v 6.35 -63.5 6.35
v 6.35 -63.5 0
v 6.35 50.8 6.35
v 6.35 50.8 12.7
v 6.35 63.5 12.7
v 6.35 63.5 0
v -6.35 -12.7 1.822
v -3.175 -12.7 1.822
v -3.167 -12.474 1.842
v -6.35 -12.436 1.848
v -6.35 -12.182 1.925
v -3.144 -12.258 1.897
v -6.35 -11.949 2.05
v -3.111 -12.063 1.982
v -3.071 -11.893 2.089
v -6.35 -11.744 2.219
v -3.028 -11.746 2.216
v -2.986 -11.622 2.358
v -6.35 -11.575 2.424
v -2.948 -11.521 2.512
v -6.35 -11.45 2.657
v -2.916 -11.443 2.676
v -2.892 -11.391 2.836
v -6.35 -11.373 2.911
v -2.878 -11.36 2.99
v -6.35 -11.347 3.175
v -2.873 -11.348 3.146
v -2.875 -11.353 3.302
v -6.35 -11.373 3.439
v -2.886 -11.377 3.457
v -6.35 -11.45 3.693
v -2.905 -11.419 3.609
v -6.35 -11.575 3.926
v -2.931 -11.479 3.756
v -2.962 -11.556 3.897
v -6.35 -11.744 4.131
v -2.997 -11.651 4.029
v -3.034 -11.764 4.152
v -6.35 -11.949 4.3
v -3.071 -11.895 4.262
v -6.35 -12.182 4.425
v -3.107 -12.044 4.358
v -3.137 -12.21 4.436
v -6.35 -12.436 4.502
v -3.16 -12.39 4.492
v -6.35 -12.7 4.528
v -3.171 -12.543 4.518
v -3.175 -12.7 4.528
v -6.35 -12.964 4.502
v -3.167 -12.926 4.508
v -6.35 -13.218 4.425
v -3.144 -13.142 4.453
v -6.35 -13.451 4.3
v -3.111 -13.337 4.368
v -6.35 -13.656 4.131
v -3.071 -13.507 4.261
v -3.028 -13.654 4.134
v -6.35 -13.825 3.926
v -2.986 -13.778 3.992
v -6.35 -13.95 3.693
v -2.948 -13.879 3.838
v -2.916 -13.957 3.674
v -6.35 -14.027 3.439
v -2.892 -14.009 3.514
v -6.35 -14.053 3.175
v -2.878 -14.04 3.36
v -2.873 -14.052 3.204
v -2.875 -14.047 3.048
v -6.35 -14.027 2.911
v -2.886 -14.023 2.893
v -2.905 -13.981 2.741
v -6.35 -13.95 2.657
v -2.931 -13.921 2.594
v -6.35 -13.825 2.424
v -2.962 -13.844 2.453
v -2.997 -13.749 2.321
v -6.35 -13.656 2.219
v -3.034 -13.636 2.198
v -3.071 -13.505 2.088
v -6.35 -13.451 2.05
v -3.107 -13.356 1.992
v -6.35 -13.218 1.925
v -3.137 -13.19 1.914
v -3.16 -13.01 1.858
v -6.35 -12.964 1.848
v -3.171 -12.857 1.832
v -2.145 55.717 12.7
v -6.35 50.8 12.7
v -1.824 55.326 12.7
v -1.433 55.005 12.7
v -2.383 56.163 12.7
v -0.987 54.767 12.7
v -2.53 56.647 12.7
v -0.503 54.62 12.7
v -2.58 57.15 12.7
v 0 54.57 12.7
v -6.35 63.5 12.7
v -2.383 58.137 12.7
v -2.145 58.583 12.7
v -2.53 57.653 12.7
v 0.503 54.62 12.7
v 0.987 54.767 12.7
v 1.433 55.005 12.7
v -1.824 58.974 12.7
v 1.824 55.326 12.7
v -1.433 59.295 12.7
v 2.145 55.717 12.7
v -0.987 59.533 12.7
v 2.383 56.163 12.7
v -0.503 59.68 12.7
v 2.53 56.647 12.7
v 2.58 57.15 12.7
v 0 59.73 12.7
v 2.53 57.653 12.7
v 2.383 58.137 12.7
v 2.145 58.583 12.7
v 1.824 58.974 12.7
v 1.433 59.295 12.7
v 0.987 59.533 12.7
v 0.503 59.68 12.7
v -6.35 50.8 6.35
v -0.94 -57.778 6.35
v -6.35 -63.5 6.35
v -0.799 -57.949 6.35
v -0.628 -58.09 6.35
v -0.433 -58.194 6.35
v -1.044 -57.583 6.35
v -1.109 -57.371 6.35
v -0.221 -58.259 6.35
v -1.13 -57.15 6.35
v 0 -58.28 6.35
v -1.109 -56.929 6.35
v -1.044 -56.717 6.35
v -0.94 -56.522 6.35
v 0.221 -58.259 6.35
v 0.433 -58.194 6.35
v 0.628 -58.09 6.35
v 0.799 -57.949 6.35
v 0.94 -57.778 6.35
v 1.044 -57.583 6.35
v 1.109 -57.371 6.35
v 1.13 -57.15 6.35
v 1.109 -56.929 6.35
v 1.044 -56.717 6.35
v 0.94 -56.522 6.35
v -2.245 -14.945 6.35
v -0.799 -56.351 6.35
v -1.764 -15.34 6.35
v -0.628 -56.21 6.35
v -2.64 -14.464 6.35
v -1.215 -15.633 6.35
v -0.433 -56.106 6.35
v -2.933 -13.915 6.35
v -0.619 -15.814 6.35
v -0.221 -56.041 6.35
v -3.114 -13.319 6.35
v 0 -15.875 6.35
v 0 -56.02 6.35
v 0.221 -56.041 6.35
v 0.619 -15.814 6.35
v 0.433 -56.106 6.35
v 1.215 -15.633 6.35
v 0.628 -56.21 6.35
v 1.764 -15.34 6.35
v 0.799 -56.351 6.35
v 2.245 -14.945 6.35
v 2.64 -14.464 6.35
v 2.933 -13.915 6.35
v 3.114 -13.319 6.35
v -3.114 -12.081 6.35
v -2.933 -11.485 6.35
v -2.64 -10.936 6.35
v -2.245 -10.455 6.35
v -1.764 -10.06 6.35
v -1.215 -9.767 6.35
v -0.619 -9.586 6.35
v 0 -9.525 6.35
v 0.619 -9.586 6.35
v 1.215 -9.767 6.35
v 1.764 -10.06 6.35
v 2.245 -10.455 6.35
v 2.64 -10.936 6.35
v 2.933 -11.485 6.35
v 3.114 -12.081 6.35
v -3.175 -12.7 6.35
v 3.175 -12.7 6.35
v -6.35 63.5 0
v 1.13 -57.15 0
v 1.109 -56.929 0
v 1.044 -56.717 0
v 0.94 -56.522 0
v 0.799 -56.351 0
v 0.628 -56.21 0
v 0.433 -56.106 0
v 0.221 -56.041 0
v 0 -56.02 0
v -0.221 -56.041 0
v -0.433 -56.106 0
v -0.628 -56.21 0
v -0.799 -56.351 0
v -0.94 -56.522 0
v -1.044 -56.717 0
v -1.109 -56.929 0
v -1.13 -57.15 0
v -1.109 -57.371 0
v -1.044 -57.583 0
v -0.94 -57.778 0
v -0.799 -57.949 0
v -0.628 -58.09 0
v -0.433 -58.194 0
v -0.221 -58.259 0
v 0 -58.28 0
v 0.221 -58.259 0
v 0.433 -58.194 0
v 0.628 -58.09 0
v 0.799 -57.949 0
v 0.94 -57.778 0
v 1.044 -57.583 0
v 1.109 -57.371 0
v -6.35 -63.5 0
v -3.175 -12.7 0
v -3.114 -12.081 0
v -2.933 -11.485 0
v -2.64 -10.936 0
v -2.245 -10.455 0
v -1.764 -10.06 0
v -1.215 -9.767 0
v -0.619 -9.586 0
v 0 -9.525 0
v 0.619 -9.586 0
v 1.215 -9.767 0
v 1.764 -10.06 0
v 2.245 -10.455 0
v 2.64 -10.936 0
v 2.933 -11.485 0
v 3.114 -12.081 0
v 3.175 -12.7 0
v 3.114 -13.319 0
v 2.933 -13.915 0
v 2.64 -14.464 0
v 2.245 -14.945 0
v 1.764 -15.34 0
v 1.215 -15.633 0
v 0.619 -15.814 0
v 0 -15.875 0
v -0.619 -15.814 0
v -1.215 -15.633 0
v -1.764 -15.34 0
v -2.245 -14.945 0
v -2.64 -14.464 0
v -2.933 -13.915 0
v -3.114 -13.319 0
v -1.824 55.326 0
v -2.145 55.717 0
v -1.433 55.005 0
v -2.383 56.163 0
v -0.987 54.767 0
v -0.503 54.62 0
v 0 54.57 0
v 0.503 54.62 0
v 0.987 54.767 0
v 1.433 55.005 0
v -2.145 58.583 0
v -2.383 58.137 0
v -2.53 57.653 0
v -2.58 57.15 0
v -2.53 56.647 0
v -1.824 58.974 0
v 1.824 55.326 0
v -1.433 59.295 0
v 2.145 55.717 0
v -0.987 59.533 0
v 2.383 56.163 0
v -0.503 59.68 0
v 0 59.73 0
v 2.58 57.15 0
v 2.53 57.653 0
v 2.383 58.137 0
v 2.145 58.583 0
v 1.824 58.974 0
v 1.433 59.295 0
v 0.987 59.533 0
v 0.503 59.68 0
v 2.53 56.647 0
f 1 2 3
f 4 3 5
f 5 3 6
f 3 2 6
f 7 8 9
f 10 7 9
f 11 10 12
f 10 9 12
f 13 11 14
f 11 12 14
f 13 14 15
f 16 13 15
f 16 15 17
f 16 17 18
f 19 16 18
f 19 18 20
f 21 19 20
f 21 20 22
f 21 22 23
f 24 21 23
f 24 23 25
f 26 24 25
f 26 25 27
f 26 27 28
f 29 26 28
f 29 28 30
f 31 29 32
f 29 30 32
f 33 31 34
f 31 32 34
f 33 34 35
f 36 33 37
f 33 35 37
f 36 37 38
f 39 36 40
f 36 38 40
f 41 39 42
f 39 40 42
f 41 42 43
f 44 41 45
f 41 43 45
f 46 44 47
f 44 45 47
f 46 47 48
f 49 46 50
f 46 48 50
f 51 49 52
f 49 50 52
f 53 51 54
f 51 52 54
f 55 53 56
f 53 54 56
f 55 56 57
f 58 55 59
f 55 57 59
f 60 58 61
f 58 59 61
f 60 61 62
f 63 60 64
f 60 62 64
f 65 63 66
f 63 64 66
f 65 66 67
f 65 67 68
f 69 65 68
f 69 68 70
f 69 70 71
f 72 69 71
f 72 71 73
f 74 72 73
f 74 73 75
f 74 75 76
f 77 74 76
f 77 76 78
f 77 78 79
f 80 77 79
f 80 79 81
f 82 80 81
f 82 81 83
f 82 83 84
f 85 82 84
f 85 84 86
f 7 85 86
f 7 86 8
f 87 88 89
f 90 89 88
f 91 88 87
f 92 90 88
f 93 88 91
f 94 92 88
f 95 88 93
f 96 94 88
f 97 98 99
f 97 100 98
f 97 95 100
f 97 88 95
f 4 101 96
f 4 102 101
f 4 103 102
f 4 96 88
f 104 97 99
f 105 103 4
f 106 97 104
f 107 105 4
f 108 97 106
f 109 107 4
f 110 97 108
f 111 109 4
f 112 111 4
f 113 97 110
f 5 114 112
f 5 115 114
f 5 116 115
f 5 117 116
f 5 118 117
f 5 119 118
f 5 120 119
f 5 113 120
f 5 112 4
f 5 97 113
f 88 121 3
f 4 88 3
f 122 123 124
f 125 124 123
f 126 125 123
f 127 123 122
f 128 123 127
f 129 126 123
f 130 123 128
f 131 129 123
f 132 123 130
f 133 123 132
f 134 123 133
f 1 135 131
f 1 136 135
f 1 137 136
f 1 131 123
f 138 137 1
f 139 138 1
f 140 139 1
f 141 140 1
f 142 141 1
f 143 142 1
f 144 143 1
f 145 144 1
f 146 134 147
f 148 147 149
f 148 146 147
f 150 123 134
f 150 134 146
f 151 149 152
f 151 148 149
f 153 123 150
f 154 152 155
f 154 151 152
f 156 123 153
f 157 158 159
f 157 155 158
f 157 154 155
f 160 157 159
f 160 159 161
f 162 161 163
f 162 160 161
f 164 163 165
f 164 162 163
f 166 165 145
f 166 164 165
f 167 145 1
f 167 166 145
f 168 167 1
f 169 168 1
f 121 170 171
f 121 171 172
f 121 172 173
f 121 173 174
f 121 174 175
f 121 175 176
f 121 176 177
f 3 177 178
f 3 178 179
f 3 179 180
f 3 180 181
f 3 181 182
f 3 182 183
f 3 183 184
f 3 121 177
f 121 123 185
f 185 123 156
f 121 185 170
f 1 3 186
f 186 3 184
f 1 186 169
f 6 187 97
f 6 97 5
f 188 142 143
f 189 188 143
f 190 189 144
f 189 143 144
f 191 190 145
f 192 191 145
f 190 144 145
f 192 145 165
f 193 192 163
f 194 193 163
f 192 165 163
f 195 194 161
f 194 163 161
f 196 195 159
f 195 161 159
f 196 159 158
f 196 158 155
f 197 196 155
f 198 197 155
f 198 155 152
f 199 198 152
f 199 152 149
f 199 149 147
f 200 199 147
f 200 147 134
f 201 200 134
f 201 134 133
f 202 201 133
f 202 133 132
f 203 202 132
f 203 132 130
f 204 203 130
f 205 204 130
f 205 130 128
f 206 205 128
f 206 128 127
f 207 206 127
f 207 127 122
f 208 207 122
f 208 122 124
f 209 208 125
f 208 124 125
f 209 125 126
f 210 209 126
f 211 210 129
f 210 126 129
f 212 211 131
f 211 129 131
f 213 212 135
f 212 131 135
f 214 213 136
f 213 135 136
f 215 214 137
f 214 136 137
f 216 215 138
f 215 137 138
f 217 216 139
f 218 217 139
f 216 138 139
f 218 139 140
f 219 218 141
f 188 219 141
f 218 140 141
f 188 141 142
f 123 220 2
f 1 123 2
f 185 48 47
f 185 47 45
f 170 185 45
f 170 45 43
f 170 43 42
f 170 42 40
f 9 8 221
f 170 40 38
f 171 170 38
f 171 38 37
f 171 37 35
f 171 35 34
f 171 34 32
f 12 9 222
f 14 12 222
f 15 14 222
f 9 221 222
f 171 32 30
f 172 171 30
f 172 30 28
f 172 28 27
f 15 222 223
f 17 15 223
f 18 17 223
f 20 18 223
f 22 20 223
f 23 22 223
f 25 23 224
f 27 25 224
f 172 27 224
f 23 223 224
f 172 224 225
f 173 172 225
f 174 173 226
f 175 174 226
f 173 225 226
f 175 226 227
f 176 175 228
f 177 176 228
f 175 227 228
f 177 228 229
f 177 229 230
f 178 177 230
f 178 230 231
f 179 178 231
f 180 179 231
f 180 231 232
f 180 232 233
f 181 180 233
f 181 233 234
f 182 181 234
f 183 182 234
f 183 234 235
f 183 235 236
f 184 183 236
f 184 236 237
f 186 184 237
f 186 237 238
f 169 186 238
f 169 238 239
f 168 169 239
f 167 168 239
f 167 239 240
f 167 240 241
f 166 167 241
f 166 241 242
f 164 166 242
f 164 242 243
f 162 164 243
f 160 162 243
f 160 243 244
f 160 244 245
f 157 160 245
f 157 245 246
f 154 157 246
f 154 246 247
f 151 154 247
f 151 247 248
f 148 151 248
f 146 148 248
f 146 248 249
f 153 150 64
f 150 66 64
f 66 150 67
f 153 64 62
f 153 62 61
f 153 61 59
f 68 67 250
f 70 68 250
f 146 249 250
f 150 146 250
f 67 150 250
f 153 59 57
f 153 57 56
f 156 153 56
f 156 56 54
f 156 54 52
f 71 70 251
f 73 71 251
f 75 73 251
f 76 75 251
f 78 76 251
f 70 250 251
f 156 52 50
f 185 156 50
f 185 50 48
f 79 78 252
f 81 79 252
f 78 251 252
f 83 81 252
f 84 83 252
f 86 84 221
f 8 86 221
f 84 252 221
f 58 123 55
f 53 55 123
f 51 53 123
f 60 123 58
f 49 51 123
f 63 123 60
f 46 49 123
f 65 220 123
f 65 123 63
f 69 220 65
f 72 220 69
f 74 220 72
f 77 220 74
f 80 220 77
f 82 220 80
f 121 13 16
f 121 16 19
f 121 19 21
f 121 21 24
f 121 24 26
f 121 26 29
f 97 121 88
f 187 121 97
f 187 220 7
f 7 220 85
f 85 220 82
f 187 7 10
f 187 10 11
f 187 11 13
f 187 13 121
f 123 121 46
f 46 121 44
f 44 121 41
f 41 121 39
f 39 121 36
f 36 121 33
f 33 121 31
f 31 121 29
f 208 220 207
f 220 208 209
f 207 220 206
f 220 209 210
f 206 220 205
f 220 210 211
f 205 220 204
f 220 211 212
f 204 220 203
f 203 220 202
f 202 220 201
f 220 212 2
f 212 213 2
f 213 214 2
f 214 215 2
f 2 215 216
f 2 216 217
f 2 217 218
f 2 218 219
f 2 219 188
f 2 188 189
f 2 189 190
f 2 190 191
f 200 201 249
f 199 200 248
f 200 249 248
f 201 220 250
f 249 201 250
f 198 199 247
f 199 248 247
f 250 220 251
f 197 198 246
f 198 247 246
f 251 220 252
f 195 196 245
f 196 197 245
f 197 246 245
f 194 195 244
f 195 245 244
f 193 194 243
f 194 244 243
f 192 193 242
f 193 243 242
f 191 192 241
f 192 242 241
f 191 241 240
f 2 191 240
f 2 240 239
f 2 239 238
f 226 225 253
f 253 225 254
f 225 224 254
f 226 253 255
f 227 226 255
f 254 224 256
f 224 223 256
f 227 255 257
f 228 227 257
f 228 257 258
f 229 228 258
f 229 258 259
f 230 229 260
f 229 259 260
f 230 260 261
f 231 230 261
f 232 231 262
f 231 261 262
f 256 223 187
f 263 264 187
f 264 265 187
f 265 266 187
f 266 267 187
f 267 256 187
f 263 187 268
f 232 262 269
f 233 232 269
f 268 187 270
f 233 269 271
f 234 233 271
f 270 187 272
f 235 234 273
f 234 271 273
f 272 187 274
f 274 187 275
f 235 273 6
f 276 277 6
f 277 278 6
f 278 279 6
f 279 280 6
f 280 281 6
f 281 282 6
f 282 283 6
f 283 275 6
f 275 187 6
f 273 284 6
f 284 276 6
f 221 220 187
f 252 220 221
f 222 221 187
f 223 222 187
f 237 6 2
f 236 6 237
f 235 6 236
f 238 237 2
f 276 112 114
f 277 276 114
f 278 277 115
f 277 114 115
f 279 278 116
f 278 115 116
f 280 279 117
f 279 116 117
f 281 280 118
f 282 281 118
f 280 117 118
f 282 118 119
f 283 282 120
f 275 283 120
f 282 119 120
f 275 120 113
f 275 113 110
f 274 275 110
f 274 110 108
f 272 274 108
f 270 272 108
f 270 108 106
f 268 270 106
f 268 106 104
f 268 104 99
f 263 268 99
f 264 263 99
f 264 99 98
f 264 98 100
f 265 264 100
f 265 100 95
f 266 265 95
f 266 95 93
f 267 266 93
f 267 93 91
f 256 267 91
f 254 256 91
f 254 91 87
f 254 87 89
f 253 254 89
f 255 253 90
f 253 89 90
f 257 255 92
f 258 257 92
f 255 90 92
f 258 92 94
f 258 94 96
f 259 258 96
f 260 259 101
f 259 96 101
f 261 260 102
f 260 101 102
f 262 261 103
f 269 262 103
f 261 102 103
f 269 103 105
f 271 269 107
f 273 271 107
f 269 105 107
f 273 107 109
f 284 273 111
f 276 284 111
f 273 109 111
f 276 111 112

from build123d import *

# Parameters (mm, degrees)
SKETCH1_W                 = 12.7
SKETCH1_H                 = 127
BOSS_EXTRUDE1_DEPTH       = 6.35
SKETCH3_W                 = 12.7
SKETCH3_H                 = 12.7
BOSS_EXTRUDE2_DEPTH       = 6.35
SKETCH4_R                 = 3.175
CUT_EXTRUDE1_DEPTH        = 66.068137364
F_4_40_TAPPED_HOLE1_D     = 2.2606
SKETCH6_OUTSIDE_W         = 40.352
SKETCH6_OUTSIDE_H         = 154.652
SKETCH6_OUTSIDE_R         = 330.2
SKETCH6_OUTSIDE_R_2       = 2.5796875
CUT_EXTRUDE3_DEPTH        = 66.068137364
F_6_32_TAPPED_HOLE1_D     = 2.7051
F_6_32_TAPPED_HOLE1_DEPTH = 6.349
F_6_32_TAPPED_HOLE1_TIP   = 0.81269403


with BuildPart() as part:
    # Sketch1 → Boss-Extrude1 (new body)
    with BuildSketch(Plane.XY):
        Rectangle(SKETCH1_W, SKETCH1_H)
    extrude(amount=BOSS_EXTRUDE1_DEPTH)

    # Sketch3 → Boss-Extrude2 (add)
    with BuildSketch(Plane.XY.offset(6.35)):
        with Locations((0, 57.15)):
            Rectangle(SKETCH3_W, SKETCH3_H)
    extrude(amount=BOSS_EXTRUDE2_DEPTH)

    # Sketch4 → Cut-Extrude1 (cut, through all)
    with BuildSketch(Plane(origin=(0, 0, 0), x_dir=(-1, 0, 0), z_dir=(0, 0, -1))):
        with Locations((0, -12.7)):
            Circle(SKETCH4_R)
    extrude(amount=-CUT_EXTRUDE1_DEPTH, mode=Mode.SUBTRACT)

    # #4-40 Tapped Hole1 (through all)
    with Locations(Plane(origin=(0, -57.15, 0), x_dir=(-1, 0, 0), z_dir=(0, 0, -1))):
        with Locations((0, 0)):
            Hole(F_4_40_TAPPED_HOLE1_D / 2)

    # Sketch6 outside → Cut-Extrude3 (cut, through all)
    # profile 1 of 2: a face of its own
    with BuildSketch(Plane.XY.offset(12.7)):
        Rectangle(SKETCH6_OUTSIDE_W, SKETCH6_OUTSIDE_H)
        with Locations((0, 57.15)):
            Circle(SKETCH6_OUTSIDE_R, mode=Mode.SUBTRACT)
    # profile 2 of 2: a face of its own
    with BuildSketch(Plane.XY.offset(12.7)):
        with Locations((0, 57.15)):
            Circle(SKETCH6_OUTSIDE_R_2)
    extrude(amount=-CUT_EXTRUDE3_DEPTH, mode=Mode.SUBTRACT)

    # #6-32 Tapped Hole1
    with Locations(Plane.ZY.offset(6.35)):
        with Locations((3.175, -12.7)):
            Hole(F_6_32_TAPPED_HOLE1_D / 2, depth=F_6_32_TAPPED_HOLE1_DEPTH)
            with Locations((0, 0, -(F_6_32_TAPPED_HOLE1_DEPTH + F_6_32_TAPPED_HOLE1_TIP / 2))):  # 118° drill point
                Cone(0, F_6_32_TAPPED_HOLE1_D / 2, F_6_32_TAPPED_HOLE1_TIP, mode=Mode.SUBTRACT)


solid = part.part
